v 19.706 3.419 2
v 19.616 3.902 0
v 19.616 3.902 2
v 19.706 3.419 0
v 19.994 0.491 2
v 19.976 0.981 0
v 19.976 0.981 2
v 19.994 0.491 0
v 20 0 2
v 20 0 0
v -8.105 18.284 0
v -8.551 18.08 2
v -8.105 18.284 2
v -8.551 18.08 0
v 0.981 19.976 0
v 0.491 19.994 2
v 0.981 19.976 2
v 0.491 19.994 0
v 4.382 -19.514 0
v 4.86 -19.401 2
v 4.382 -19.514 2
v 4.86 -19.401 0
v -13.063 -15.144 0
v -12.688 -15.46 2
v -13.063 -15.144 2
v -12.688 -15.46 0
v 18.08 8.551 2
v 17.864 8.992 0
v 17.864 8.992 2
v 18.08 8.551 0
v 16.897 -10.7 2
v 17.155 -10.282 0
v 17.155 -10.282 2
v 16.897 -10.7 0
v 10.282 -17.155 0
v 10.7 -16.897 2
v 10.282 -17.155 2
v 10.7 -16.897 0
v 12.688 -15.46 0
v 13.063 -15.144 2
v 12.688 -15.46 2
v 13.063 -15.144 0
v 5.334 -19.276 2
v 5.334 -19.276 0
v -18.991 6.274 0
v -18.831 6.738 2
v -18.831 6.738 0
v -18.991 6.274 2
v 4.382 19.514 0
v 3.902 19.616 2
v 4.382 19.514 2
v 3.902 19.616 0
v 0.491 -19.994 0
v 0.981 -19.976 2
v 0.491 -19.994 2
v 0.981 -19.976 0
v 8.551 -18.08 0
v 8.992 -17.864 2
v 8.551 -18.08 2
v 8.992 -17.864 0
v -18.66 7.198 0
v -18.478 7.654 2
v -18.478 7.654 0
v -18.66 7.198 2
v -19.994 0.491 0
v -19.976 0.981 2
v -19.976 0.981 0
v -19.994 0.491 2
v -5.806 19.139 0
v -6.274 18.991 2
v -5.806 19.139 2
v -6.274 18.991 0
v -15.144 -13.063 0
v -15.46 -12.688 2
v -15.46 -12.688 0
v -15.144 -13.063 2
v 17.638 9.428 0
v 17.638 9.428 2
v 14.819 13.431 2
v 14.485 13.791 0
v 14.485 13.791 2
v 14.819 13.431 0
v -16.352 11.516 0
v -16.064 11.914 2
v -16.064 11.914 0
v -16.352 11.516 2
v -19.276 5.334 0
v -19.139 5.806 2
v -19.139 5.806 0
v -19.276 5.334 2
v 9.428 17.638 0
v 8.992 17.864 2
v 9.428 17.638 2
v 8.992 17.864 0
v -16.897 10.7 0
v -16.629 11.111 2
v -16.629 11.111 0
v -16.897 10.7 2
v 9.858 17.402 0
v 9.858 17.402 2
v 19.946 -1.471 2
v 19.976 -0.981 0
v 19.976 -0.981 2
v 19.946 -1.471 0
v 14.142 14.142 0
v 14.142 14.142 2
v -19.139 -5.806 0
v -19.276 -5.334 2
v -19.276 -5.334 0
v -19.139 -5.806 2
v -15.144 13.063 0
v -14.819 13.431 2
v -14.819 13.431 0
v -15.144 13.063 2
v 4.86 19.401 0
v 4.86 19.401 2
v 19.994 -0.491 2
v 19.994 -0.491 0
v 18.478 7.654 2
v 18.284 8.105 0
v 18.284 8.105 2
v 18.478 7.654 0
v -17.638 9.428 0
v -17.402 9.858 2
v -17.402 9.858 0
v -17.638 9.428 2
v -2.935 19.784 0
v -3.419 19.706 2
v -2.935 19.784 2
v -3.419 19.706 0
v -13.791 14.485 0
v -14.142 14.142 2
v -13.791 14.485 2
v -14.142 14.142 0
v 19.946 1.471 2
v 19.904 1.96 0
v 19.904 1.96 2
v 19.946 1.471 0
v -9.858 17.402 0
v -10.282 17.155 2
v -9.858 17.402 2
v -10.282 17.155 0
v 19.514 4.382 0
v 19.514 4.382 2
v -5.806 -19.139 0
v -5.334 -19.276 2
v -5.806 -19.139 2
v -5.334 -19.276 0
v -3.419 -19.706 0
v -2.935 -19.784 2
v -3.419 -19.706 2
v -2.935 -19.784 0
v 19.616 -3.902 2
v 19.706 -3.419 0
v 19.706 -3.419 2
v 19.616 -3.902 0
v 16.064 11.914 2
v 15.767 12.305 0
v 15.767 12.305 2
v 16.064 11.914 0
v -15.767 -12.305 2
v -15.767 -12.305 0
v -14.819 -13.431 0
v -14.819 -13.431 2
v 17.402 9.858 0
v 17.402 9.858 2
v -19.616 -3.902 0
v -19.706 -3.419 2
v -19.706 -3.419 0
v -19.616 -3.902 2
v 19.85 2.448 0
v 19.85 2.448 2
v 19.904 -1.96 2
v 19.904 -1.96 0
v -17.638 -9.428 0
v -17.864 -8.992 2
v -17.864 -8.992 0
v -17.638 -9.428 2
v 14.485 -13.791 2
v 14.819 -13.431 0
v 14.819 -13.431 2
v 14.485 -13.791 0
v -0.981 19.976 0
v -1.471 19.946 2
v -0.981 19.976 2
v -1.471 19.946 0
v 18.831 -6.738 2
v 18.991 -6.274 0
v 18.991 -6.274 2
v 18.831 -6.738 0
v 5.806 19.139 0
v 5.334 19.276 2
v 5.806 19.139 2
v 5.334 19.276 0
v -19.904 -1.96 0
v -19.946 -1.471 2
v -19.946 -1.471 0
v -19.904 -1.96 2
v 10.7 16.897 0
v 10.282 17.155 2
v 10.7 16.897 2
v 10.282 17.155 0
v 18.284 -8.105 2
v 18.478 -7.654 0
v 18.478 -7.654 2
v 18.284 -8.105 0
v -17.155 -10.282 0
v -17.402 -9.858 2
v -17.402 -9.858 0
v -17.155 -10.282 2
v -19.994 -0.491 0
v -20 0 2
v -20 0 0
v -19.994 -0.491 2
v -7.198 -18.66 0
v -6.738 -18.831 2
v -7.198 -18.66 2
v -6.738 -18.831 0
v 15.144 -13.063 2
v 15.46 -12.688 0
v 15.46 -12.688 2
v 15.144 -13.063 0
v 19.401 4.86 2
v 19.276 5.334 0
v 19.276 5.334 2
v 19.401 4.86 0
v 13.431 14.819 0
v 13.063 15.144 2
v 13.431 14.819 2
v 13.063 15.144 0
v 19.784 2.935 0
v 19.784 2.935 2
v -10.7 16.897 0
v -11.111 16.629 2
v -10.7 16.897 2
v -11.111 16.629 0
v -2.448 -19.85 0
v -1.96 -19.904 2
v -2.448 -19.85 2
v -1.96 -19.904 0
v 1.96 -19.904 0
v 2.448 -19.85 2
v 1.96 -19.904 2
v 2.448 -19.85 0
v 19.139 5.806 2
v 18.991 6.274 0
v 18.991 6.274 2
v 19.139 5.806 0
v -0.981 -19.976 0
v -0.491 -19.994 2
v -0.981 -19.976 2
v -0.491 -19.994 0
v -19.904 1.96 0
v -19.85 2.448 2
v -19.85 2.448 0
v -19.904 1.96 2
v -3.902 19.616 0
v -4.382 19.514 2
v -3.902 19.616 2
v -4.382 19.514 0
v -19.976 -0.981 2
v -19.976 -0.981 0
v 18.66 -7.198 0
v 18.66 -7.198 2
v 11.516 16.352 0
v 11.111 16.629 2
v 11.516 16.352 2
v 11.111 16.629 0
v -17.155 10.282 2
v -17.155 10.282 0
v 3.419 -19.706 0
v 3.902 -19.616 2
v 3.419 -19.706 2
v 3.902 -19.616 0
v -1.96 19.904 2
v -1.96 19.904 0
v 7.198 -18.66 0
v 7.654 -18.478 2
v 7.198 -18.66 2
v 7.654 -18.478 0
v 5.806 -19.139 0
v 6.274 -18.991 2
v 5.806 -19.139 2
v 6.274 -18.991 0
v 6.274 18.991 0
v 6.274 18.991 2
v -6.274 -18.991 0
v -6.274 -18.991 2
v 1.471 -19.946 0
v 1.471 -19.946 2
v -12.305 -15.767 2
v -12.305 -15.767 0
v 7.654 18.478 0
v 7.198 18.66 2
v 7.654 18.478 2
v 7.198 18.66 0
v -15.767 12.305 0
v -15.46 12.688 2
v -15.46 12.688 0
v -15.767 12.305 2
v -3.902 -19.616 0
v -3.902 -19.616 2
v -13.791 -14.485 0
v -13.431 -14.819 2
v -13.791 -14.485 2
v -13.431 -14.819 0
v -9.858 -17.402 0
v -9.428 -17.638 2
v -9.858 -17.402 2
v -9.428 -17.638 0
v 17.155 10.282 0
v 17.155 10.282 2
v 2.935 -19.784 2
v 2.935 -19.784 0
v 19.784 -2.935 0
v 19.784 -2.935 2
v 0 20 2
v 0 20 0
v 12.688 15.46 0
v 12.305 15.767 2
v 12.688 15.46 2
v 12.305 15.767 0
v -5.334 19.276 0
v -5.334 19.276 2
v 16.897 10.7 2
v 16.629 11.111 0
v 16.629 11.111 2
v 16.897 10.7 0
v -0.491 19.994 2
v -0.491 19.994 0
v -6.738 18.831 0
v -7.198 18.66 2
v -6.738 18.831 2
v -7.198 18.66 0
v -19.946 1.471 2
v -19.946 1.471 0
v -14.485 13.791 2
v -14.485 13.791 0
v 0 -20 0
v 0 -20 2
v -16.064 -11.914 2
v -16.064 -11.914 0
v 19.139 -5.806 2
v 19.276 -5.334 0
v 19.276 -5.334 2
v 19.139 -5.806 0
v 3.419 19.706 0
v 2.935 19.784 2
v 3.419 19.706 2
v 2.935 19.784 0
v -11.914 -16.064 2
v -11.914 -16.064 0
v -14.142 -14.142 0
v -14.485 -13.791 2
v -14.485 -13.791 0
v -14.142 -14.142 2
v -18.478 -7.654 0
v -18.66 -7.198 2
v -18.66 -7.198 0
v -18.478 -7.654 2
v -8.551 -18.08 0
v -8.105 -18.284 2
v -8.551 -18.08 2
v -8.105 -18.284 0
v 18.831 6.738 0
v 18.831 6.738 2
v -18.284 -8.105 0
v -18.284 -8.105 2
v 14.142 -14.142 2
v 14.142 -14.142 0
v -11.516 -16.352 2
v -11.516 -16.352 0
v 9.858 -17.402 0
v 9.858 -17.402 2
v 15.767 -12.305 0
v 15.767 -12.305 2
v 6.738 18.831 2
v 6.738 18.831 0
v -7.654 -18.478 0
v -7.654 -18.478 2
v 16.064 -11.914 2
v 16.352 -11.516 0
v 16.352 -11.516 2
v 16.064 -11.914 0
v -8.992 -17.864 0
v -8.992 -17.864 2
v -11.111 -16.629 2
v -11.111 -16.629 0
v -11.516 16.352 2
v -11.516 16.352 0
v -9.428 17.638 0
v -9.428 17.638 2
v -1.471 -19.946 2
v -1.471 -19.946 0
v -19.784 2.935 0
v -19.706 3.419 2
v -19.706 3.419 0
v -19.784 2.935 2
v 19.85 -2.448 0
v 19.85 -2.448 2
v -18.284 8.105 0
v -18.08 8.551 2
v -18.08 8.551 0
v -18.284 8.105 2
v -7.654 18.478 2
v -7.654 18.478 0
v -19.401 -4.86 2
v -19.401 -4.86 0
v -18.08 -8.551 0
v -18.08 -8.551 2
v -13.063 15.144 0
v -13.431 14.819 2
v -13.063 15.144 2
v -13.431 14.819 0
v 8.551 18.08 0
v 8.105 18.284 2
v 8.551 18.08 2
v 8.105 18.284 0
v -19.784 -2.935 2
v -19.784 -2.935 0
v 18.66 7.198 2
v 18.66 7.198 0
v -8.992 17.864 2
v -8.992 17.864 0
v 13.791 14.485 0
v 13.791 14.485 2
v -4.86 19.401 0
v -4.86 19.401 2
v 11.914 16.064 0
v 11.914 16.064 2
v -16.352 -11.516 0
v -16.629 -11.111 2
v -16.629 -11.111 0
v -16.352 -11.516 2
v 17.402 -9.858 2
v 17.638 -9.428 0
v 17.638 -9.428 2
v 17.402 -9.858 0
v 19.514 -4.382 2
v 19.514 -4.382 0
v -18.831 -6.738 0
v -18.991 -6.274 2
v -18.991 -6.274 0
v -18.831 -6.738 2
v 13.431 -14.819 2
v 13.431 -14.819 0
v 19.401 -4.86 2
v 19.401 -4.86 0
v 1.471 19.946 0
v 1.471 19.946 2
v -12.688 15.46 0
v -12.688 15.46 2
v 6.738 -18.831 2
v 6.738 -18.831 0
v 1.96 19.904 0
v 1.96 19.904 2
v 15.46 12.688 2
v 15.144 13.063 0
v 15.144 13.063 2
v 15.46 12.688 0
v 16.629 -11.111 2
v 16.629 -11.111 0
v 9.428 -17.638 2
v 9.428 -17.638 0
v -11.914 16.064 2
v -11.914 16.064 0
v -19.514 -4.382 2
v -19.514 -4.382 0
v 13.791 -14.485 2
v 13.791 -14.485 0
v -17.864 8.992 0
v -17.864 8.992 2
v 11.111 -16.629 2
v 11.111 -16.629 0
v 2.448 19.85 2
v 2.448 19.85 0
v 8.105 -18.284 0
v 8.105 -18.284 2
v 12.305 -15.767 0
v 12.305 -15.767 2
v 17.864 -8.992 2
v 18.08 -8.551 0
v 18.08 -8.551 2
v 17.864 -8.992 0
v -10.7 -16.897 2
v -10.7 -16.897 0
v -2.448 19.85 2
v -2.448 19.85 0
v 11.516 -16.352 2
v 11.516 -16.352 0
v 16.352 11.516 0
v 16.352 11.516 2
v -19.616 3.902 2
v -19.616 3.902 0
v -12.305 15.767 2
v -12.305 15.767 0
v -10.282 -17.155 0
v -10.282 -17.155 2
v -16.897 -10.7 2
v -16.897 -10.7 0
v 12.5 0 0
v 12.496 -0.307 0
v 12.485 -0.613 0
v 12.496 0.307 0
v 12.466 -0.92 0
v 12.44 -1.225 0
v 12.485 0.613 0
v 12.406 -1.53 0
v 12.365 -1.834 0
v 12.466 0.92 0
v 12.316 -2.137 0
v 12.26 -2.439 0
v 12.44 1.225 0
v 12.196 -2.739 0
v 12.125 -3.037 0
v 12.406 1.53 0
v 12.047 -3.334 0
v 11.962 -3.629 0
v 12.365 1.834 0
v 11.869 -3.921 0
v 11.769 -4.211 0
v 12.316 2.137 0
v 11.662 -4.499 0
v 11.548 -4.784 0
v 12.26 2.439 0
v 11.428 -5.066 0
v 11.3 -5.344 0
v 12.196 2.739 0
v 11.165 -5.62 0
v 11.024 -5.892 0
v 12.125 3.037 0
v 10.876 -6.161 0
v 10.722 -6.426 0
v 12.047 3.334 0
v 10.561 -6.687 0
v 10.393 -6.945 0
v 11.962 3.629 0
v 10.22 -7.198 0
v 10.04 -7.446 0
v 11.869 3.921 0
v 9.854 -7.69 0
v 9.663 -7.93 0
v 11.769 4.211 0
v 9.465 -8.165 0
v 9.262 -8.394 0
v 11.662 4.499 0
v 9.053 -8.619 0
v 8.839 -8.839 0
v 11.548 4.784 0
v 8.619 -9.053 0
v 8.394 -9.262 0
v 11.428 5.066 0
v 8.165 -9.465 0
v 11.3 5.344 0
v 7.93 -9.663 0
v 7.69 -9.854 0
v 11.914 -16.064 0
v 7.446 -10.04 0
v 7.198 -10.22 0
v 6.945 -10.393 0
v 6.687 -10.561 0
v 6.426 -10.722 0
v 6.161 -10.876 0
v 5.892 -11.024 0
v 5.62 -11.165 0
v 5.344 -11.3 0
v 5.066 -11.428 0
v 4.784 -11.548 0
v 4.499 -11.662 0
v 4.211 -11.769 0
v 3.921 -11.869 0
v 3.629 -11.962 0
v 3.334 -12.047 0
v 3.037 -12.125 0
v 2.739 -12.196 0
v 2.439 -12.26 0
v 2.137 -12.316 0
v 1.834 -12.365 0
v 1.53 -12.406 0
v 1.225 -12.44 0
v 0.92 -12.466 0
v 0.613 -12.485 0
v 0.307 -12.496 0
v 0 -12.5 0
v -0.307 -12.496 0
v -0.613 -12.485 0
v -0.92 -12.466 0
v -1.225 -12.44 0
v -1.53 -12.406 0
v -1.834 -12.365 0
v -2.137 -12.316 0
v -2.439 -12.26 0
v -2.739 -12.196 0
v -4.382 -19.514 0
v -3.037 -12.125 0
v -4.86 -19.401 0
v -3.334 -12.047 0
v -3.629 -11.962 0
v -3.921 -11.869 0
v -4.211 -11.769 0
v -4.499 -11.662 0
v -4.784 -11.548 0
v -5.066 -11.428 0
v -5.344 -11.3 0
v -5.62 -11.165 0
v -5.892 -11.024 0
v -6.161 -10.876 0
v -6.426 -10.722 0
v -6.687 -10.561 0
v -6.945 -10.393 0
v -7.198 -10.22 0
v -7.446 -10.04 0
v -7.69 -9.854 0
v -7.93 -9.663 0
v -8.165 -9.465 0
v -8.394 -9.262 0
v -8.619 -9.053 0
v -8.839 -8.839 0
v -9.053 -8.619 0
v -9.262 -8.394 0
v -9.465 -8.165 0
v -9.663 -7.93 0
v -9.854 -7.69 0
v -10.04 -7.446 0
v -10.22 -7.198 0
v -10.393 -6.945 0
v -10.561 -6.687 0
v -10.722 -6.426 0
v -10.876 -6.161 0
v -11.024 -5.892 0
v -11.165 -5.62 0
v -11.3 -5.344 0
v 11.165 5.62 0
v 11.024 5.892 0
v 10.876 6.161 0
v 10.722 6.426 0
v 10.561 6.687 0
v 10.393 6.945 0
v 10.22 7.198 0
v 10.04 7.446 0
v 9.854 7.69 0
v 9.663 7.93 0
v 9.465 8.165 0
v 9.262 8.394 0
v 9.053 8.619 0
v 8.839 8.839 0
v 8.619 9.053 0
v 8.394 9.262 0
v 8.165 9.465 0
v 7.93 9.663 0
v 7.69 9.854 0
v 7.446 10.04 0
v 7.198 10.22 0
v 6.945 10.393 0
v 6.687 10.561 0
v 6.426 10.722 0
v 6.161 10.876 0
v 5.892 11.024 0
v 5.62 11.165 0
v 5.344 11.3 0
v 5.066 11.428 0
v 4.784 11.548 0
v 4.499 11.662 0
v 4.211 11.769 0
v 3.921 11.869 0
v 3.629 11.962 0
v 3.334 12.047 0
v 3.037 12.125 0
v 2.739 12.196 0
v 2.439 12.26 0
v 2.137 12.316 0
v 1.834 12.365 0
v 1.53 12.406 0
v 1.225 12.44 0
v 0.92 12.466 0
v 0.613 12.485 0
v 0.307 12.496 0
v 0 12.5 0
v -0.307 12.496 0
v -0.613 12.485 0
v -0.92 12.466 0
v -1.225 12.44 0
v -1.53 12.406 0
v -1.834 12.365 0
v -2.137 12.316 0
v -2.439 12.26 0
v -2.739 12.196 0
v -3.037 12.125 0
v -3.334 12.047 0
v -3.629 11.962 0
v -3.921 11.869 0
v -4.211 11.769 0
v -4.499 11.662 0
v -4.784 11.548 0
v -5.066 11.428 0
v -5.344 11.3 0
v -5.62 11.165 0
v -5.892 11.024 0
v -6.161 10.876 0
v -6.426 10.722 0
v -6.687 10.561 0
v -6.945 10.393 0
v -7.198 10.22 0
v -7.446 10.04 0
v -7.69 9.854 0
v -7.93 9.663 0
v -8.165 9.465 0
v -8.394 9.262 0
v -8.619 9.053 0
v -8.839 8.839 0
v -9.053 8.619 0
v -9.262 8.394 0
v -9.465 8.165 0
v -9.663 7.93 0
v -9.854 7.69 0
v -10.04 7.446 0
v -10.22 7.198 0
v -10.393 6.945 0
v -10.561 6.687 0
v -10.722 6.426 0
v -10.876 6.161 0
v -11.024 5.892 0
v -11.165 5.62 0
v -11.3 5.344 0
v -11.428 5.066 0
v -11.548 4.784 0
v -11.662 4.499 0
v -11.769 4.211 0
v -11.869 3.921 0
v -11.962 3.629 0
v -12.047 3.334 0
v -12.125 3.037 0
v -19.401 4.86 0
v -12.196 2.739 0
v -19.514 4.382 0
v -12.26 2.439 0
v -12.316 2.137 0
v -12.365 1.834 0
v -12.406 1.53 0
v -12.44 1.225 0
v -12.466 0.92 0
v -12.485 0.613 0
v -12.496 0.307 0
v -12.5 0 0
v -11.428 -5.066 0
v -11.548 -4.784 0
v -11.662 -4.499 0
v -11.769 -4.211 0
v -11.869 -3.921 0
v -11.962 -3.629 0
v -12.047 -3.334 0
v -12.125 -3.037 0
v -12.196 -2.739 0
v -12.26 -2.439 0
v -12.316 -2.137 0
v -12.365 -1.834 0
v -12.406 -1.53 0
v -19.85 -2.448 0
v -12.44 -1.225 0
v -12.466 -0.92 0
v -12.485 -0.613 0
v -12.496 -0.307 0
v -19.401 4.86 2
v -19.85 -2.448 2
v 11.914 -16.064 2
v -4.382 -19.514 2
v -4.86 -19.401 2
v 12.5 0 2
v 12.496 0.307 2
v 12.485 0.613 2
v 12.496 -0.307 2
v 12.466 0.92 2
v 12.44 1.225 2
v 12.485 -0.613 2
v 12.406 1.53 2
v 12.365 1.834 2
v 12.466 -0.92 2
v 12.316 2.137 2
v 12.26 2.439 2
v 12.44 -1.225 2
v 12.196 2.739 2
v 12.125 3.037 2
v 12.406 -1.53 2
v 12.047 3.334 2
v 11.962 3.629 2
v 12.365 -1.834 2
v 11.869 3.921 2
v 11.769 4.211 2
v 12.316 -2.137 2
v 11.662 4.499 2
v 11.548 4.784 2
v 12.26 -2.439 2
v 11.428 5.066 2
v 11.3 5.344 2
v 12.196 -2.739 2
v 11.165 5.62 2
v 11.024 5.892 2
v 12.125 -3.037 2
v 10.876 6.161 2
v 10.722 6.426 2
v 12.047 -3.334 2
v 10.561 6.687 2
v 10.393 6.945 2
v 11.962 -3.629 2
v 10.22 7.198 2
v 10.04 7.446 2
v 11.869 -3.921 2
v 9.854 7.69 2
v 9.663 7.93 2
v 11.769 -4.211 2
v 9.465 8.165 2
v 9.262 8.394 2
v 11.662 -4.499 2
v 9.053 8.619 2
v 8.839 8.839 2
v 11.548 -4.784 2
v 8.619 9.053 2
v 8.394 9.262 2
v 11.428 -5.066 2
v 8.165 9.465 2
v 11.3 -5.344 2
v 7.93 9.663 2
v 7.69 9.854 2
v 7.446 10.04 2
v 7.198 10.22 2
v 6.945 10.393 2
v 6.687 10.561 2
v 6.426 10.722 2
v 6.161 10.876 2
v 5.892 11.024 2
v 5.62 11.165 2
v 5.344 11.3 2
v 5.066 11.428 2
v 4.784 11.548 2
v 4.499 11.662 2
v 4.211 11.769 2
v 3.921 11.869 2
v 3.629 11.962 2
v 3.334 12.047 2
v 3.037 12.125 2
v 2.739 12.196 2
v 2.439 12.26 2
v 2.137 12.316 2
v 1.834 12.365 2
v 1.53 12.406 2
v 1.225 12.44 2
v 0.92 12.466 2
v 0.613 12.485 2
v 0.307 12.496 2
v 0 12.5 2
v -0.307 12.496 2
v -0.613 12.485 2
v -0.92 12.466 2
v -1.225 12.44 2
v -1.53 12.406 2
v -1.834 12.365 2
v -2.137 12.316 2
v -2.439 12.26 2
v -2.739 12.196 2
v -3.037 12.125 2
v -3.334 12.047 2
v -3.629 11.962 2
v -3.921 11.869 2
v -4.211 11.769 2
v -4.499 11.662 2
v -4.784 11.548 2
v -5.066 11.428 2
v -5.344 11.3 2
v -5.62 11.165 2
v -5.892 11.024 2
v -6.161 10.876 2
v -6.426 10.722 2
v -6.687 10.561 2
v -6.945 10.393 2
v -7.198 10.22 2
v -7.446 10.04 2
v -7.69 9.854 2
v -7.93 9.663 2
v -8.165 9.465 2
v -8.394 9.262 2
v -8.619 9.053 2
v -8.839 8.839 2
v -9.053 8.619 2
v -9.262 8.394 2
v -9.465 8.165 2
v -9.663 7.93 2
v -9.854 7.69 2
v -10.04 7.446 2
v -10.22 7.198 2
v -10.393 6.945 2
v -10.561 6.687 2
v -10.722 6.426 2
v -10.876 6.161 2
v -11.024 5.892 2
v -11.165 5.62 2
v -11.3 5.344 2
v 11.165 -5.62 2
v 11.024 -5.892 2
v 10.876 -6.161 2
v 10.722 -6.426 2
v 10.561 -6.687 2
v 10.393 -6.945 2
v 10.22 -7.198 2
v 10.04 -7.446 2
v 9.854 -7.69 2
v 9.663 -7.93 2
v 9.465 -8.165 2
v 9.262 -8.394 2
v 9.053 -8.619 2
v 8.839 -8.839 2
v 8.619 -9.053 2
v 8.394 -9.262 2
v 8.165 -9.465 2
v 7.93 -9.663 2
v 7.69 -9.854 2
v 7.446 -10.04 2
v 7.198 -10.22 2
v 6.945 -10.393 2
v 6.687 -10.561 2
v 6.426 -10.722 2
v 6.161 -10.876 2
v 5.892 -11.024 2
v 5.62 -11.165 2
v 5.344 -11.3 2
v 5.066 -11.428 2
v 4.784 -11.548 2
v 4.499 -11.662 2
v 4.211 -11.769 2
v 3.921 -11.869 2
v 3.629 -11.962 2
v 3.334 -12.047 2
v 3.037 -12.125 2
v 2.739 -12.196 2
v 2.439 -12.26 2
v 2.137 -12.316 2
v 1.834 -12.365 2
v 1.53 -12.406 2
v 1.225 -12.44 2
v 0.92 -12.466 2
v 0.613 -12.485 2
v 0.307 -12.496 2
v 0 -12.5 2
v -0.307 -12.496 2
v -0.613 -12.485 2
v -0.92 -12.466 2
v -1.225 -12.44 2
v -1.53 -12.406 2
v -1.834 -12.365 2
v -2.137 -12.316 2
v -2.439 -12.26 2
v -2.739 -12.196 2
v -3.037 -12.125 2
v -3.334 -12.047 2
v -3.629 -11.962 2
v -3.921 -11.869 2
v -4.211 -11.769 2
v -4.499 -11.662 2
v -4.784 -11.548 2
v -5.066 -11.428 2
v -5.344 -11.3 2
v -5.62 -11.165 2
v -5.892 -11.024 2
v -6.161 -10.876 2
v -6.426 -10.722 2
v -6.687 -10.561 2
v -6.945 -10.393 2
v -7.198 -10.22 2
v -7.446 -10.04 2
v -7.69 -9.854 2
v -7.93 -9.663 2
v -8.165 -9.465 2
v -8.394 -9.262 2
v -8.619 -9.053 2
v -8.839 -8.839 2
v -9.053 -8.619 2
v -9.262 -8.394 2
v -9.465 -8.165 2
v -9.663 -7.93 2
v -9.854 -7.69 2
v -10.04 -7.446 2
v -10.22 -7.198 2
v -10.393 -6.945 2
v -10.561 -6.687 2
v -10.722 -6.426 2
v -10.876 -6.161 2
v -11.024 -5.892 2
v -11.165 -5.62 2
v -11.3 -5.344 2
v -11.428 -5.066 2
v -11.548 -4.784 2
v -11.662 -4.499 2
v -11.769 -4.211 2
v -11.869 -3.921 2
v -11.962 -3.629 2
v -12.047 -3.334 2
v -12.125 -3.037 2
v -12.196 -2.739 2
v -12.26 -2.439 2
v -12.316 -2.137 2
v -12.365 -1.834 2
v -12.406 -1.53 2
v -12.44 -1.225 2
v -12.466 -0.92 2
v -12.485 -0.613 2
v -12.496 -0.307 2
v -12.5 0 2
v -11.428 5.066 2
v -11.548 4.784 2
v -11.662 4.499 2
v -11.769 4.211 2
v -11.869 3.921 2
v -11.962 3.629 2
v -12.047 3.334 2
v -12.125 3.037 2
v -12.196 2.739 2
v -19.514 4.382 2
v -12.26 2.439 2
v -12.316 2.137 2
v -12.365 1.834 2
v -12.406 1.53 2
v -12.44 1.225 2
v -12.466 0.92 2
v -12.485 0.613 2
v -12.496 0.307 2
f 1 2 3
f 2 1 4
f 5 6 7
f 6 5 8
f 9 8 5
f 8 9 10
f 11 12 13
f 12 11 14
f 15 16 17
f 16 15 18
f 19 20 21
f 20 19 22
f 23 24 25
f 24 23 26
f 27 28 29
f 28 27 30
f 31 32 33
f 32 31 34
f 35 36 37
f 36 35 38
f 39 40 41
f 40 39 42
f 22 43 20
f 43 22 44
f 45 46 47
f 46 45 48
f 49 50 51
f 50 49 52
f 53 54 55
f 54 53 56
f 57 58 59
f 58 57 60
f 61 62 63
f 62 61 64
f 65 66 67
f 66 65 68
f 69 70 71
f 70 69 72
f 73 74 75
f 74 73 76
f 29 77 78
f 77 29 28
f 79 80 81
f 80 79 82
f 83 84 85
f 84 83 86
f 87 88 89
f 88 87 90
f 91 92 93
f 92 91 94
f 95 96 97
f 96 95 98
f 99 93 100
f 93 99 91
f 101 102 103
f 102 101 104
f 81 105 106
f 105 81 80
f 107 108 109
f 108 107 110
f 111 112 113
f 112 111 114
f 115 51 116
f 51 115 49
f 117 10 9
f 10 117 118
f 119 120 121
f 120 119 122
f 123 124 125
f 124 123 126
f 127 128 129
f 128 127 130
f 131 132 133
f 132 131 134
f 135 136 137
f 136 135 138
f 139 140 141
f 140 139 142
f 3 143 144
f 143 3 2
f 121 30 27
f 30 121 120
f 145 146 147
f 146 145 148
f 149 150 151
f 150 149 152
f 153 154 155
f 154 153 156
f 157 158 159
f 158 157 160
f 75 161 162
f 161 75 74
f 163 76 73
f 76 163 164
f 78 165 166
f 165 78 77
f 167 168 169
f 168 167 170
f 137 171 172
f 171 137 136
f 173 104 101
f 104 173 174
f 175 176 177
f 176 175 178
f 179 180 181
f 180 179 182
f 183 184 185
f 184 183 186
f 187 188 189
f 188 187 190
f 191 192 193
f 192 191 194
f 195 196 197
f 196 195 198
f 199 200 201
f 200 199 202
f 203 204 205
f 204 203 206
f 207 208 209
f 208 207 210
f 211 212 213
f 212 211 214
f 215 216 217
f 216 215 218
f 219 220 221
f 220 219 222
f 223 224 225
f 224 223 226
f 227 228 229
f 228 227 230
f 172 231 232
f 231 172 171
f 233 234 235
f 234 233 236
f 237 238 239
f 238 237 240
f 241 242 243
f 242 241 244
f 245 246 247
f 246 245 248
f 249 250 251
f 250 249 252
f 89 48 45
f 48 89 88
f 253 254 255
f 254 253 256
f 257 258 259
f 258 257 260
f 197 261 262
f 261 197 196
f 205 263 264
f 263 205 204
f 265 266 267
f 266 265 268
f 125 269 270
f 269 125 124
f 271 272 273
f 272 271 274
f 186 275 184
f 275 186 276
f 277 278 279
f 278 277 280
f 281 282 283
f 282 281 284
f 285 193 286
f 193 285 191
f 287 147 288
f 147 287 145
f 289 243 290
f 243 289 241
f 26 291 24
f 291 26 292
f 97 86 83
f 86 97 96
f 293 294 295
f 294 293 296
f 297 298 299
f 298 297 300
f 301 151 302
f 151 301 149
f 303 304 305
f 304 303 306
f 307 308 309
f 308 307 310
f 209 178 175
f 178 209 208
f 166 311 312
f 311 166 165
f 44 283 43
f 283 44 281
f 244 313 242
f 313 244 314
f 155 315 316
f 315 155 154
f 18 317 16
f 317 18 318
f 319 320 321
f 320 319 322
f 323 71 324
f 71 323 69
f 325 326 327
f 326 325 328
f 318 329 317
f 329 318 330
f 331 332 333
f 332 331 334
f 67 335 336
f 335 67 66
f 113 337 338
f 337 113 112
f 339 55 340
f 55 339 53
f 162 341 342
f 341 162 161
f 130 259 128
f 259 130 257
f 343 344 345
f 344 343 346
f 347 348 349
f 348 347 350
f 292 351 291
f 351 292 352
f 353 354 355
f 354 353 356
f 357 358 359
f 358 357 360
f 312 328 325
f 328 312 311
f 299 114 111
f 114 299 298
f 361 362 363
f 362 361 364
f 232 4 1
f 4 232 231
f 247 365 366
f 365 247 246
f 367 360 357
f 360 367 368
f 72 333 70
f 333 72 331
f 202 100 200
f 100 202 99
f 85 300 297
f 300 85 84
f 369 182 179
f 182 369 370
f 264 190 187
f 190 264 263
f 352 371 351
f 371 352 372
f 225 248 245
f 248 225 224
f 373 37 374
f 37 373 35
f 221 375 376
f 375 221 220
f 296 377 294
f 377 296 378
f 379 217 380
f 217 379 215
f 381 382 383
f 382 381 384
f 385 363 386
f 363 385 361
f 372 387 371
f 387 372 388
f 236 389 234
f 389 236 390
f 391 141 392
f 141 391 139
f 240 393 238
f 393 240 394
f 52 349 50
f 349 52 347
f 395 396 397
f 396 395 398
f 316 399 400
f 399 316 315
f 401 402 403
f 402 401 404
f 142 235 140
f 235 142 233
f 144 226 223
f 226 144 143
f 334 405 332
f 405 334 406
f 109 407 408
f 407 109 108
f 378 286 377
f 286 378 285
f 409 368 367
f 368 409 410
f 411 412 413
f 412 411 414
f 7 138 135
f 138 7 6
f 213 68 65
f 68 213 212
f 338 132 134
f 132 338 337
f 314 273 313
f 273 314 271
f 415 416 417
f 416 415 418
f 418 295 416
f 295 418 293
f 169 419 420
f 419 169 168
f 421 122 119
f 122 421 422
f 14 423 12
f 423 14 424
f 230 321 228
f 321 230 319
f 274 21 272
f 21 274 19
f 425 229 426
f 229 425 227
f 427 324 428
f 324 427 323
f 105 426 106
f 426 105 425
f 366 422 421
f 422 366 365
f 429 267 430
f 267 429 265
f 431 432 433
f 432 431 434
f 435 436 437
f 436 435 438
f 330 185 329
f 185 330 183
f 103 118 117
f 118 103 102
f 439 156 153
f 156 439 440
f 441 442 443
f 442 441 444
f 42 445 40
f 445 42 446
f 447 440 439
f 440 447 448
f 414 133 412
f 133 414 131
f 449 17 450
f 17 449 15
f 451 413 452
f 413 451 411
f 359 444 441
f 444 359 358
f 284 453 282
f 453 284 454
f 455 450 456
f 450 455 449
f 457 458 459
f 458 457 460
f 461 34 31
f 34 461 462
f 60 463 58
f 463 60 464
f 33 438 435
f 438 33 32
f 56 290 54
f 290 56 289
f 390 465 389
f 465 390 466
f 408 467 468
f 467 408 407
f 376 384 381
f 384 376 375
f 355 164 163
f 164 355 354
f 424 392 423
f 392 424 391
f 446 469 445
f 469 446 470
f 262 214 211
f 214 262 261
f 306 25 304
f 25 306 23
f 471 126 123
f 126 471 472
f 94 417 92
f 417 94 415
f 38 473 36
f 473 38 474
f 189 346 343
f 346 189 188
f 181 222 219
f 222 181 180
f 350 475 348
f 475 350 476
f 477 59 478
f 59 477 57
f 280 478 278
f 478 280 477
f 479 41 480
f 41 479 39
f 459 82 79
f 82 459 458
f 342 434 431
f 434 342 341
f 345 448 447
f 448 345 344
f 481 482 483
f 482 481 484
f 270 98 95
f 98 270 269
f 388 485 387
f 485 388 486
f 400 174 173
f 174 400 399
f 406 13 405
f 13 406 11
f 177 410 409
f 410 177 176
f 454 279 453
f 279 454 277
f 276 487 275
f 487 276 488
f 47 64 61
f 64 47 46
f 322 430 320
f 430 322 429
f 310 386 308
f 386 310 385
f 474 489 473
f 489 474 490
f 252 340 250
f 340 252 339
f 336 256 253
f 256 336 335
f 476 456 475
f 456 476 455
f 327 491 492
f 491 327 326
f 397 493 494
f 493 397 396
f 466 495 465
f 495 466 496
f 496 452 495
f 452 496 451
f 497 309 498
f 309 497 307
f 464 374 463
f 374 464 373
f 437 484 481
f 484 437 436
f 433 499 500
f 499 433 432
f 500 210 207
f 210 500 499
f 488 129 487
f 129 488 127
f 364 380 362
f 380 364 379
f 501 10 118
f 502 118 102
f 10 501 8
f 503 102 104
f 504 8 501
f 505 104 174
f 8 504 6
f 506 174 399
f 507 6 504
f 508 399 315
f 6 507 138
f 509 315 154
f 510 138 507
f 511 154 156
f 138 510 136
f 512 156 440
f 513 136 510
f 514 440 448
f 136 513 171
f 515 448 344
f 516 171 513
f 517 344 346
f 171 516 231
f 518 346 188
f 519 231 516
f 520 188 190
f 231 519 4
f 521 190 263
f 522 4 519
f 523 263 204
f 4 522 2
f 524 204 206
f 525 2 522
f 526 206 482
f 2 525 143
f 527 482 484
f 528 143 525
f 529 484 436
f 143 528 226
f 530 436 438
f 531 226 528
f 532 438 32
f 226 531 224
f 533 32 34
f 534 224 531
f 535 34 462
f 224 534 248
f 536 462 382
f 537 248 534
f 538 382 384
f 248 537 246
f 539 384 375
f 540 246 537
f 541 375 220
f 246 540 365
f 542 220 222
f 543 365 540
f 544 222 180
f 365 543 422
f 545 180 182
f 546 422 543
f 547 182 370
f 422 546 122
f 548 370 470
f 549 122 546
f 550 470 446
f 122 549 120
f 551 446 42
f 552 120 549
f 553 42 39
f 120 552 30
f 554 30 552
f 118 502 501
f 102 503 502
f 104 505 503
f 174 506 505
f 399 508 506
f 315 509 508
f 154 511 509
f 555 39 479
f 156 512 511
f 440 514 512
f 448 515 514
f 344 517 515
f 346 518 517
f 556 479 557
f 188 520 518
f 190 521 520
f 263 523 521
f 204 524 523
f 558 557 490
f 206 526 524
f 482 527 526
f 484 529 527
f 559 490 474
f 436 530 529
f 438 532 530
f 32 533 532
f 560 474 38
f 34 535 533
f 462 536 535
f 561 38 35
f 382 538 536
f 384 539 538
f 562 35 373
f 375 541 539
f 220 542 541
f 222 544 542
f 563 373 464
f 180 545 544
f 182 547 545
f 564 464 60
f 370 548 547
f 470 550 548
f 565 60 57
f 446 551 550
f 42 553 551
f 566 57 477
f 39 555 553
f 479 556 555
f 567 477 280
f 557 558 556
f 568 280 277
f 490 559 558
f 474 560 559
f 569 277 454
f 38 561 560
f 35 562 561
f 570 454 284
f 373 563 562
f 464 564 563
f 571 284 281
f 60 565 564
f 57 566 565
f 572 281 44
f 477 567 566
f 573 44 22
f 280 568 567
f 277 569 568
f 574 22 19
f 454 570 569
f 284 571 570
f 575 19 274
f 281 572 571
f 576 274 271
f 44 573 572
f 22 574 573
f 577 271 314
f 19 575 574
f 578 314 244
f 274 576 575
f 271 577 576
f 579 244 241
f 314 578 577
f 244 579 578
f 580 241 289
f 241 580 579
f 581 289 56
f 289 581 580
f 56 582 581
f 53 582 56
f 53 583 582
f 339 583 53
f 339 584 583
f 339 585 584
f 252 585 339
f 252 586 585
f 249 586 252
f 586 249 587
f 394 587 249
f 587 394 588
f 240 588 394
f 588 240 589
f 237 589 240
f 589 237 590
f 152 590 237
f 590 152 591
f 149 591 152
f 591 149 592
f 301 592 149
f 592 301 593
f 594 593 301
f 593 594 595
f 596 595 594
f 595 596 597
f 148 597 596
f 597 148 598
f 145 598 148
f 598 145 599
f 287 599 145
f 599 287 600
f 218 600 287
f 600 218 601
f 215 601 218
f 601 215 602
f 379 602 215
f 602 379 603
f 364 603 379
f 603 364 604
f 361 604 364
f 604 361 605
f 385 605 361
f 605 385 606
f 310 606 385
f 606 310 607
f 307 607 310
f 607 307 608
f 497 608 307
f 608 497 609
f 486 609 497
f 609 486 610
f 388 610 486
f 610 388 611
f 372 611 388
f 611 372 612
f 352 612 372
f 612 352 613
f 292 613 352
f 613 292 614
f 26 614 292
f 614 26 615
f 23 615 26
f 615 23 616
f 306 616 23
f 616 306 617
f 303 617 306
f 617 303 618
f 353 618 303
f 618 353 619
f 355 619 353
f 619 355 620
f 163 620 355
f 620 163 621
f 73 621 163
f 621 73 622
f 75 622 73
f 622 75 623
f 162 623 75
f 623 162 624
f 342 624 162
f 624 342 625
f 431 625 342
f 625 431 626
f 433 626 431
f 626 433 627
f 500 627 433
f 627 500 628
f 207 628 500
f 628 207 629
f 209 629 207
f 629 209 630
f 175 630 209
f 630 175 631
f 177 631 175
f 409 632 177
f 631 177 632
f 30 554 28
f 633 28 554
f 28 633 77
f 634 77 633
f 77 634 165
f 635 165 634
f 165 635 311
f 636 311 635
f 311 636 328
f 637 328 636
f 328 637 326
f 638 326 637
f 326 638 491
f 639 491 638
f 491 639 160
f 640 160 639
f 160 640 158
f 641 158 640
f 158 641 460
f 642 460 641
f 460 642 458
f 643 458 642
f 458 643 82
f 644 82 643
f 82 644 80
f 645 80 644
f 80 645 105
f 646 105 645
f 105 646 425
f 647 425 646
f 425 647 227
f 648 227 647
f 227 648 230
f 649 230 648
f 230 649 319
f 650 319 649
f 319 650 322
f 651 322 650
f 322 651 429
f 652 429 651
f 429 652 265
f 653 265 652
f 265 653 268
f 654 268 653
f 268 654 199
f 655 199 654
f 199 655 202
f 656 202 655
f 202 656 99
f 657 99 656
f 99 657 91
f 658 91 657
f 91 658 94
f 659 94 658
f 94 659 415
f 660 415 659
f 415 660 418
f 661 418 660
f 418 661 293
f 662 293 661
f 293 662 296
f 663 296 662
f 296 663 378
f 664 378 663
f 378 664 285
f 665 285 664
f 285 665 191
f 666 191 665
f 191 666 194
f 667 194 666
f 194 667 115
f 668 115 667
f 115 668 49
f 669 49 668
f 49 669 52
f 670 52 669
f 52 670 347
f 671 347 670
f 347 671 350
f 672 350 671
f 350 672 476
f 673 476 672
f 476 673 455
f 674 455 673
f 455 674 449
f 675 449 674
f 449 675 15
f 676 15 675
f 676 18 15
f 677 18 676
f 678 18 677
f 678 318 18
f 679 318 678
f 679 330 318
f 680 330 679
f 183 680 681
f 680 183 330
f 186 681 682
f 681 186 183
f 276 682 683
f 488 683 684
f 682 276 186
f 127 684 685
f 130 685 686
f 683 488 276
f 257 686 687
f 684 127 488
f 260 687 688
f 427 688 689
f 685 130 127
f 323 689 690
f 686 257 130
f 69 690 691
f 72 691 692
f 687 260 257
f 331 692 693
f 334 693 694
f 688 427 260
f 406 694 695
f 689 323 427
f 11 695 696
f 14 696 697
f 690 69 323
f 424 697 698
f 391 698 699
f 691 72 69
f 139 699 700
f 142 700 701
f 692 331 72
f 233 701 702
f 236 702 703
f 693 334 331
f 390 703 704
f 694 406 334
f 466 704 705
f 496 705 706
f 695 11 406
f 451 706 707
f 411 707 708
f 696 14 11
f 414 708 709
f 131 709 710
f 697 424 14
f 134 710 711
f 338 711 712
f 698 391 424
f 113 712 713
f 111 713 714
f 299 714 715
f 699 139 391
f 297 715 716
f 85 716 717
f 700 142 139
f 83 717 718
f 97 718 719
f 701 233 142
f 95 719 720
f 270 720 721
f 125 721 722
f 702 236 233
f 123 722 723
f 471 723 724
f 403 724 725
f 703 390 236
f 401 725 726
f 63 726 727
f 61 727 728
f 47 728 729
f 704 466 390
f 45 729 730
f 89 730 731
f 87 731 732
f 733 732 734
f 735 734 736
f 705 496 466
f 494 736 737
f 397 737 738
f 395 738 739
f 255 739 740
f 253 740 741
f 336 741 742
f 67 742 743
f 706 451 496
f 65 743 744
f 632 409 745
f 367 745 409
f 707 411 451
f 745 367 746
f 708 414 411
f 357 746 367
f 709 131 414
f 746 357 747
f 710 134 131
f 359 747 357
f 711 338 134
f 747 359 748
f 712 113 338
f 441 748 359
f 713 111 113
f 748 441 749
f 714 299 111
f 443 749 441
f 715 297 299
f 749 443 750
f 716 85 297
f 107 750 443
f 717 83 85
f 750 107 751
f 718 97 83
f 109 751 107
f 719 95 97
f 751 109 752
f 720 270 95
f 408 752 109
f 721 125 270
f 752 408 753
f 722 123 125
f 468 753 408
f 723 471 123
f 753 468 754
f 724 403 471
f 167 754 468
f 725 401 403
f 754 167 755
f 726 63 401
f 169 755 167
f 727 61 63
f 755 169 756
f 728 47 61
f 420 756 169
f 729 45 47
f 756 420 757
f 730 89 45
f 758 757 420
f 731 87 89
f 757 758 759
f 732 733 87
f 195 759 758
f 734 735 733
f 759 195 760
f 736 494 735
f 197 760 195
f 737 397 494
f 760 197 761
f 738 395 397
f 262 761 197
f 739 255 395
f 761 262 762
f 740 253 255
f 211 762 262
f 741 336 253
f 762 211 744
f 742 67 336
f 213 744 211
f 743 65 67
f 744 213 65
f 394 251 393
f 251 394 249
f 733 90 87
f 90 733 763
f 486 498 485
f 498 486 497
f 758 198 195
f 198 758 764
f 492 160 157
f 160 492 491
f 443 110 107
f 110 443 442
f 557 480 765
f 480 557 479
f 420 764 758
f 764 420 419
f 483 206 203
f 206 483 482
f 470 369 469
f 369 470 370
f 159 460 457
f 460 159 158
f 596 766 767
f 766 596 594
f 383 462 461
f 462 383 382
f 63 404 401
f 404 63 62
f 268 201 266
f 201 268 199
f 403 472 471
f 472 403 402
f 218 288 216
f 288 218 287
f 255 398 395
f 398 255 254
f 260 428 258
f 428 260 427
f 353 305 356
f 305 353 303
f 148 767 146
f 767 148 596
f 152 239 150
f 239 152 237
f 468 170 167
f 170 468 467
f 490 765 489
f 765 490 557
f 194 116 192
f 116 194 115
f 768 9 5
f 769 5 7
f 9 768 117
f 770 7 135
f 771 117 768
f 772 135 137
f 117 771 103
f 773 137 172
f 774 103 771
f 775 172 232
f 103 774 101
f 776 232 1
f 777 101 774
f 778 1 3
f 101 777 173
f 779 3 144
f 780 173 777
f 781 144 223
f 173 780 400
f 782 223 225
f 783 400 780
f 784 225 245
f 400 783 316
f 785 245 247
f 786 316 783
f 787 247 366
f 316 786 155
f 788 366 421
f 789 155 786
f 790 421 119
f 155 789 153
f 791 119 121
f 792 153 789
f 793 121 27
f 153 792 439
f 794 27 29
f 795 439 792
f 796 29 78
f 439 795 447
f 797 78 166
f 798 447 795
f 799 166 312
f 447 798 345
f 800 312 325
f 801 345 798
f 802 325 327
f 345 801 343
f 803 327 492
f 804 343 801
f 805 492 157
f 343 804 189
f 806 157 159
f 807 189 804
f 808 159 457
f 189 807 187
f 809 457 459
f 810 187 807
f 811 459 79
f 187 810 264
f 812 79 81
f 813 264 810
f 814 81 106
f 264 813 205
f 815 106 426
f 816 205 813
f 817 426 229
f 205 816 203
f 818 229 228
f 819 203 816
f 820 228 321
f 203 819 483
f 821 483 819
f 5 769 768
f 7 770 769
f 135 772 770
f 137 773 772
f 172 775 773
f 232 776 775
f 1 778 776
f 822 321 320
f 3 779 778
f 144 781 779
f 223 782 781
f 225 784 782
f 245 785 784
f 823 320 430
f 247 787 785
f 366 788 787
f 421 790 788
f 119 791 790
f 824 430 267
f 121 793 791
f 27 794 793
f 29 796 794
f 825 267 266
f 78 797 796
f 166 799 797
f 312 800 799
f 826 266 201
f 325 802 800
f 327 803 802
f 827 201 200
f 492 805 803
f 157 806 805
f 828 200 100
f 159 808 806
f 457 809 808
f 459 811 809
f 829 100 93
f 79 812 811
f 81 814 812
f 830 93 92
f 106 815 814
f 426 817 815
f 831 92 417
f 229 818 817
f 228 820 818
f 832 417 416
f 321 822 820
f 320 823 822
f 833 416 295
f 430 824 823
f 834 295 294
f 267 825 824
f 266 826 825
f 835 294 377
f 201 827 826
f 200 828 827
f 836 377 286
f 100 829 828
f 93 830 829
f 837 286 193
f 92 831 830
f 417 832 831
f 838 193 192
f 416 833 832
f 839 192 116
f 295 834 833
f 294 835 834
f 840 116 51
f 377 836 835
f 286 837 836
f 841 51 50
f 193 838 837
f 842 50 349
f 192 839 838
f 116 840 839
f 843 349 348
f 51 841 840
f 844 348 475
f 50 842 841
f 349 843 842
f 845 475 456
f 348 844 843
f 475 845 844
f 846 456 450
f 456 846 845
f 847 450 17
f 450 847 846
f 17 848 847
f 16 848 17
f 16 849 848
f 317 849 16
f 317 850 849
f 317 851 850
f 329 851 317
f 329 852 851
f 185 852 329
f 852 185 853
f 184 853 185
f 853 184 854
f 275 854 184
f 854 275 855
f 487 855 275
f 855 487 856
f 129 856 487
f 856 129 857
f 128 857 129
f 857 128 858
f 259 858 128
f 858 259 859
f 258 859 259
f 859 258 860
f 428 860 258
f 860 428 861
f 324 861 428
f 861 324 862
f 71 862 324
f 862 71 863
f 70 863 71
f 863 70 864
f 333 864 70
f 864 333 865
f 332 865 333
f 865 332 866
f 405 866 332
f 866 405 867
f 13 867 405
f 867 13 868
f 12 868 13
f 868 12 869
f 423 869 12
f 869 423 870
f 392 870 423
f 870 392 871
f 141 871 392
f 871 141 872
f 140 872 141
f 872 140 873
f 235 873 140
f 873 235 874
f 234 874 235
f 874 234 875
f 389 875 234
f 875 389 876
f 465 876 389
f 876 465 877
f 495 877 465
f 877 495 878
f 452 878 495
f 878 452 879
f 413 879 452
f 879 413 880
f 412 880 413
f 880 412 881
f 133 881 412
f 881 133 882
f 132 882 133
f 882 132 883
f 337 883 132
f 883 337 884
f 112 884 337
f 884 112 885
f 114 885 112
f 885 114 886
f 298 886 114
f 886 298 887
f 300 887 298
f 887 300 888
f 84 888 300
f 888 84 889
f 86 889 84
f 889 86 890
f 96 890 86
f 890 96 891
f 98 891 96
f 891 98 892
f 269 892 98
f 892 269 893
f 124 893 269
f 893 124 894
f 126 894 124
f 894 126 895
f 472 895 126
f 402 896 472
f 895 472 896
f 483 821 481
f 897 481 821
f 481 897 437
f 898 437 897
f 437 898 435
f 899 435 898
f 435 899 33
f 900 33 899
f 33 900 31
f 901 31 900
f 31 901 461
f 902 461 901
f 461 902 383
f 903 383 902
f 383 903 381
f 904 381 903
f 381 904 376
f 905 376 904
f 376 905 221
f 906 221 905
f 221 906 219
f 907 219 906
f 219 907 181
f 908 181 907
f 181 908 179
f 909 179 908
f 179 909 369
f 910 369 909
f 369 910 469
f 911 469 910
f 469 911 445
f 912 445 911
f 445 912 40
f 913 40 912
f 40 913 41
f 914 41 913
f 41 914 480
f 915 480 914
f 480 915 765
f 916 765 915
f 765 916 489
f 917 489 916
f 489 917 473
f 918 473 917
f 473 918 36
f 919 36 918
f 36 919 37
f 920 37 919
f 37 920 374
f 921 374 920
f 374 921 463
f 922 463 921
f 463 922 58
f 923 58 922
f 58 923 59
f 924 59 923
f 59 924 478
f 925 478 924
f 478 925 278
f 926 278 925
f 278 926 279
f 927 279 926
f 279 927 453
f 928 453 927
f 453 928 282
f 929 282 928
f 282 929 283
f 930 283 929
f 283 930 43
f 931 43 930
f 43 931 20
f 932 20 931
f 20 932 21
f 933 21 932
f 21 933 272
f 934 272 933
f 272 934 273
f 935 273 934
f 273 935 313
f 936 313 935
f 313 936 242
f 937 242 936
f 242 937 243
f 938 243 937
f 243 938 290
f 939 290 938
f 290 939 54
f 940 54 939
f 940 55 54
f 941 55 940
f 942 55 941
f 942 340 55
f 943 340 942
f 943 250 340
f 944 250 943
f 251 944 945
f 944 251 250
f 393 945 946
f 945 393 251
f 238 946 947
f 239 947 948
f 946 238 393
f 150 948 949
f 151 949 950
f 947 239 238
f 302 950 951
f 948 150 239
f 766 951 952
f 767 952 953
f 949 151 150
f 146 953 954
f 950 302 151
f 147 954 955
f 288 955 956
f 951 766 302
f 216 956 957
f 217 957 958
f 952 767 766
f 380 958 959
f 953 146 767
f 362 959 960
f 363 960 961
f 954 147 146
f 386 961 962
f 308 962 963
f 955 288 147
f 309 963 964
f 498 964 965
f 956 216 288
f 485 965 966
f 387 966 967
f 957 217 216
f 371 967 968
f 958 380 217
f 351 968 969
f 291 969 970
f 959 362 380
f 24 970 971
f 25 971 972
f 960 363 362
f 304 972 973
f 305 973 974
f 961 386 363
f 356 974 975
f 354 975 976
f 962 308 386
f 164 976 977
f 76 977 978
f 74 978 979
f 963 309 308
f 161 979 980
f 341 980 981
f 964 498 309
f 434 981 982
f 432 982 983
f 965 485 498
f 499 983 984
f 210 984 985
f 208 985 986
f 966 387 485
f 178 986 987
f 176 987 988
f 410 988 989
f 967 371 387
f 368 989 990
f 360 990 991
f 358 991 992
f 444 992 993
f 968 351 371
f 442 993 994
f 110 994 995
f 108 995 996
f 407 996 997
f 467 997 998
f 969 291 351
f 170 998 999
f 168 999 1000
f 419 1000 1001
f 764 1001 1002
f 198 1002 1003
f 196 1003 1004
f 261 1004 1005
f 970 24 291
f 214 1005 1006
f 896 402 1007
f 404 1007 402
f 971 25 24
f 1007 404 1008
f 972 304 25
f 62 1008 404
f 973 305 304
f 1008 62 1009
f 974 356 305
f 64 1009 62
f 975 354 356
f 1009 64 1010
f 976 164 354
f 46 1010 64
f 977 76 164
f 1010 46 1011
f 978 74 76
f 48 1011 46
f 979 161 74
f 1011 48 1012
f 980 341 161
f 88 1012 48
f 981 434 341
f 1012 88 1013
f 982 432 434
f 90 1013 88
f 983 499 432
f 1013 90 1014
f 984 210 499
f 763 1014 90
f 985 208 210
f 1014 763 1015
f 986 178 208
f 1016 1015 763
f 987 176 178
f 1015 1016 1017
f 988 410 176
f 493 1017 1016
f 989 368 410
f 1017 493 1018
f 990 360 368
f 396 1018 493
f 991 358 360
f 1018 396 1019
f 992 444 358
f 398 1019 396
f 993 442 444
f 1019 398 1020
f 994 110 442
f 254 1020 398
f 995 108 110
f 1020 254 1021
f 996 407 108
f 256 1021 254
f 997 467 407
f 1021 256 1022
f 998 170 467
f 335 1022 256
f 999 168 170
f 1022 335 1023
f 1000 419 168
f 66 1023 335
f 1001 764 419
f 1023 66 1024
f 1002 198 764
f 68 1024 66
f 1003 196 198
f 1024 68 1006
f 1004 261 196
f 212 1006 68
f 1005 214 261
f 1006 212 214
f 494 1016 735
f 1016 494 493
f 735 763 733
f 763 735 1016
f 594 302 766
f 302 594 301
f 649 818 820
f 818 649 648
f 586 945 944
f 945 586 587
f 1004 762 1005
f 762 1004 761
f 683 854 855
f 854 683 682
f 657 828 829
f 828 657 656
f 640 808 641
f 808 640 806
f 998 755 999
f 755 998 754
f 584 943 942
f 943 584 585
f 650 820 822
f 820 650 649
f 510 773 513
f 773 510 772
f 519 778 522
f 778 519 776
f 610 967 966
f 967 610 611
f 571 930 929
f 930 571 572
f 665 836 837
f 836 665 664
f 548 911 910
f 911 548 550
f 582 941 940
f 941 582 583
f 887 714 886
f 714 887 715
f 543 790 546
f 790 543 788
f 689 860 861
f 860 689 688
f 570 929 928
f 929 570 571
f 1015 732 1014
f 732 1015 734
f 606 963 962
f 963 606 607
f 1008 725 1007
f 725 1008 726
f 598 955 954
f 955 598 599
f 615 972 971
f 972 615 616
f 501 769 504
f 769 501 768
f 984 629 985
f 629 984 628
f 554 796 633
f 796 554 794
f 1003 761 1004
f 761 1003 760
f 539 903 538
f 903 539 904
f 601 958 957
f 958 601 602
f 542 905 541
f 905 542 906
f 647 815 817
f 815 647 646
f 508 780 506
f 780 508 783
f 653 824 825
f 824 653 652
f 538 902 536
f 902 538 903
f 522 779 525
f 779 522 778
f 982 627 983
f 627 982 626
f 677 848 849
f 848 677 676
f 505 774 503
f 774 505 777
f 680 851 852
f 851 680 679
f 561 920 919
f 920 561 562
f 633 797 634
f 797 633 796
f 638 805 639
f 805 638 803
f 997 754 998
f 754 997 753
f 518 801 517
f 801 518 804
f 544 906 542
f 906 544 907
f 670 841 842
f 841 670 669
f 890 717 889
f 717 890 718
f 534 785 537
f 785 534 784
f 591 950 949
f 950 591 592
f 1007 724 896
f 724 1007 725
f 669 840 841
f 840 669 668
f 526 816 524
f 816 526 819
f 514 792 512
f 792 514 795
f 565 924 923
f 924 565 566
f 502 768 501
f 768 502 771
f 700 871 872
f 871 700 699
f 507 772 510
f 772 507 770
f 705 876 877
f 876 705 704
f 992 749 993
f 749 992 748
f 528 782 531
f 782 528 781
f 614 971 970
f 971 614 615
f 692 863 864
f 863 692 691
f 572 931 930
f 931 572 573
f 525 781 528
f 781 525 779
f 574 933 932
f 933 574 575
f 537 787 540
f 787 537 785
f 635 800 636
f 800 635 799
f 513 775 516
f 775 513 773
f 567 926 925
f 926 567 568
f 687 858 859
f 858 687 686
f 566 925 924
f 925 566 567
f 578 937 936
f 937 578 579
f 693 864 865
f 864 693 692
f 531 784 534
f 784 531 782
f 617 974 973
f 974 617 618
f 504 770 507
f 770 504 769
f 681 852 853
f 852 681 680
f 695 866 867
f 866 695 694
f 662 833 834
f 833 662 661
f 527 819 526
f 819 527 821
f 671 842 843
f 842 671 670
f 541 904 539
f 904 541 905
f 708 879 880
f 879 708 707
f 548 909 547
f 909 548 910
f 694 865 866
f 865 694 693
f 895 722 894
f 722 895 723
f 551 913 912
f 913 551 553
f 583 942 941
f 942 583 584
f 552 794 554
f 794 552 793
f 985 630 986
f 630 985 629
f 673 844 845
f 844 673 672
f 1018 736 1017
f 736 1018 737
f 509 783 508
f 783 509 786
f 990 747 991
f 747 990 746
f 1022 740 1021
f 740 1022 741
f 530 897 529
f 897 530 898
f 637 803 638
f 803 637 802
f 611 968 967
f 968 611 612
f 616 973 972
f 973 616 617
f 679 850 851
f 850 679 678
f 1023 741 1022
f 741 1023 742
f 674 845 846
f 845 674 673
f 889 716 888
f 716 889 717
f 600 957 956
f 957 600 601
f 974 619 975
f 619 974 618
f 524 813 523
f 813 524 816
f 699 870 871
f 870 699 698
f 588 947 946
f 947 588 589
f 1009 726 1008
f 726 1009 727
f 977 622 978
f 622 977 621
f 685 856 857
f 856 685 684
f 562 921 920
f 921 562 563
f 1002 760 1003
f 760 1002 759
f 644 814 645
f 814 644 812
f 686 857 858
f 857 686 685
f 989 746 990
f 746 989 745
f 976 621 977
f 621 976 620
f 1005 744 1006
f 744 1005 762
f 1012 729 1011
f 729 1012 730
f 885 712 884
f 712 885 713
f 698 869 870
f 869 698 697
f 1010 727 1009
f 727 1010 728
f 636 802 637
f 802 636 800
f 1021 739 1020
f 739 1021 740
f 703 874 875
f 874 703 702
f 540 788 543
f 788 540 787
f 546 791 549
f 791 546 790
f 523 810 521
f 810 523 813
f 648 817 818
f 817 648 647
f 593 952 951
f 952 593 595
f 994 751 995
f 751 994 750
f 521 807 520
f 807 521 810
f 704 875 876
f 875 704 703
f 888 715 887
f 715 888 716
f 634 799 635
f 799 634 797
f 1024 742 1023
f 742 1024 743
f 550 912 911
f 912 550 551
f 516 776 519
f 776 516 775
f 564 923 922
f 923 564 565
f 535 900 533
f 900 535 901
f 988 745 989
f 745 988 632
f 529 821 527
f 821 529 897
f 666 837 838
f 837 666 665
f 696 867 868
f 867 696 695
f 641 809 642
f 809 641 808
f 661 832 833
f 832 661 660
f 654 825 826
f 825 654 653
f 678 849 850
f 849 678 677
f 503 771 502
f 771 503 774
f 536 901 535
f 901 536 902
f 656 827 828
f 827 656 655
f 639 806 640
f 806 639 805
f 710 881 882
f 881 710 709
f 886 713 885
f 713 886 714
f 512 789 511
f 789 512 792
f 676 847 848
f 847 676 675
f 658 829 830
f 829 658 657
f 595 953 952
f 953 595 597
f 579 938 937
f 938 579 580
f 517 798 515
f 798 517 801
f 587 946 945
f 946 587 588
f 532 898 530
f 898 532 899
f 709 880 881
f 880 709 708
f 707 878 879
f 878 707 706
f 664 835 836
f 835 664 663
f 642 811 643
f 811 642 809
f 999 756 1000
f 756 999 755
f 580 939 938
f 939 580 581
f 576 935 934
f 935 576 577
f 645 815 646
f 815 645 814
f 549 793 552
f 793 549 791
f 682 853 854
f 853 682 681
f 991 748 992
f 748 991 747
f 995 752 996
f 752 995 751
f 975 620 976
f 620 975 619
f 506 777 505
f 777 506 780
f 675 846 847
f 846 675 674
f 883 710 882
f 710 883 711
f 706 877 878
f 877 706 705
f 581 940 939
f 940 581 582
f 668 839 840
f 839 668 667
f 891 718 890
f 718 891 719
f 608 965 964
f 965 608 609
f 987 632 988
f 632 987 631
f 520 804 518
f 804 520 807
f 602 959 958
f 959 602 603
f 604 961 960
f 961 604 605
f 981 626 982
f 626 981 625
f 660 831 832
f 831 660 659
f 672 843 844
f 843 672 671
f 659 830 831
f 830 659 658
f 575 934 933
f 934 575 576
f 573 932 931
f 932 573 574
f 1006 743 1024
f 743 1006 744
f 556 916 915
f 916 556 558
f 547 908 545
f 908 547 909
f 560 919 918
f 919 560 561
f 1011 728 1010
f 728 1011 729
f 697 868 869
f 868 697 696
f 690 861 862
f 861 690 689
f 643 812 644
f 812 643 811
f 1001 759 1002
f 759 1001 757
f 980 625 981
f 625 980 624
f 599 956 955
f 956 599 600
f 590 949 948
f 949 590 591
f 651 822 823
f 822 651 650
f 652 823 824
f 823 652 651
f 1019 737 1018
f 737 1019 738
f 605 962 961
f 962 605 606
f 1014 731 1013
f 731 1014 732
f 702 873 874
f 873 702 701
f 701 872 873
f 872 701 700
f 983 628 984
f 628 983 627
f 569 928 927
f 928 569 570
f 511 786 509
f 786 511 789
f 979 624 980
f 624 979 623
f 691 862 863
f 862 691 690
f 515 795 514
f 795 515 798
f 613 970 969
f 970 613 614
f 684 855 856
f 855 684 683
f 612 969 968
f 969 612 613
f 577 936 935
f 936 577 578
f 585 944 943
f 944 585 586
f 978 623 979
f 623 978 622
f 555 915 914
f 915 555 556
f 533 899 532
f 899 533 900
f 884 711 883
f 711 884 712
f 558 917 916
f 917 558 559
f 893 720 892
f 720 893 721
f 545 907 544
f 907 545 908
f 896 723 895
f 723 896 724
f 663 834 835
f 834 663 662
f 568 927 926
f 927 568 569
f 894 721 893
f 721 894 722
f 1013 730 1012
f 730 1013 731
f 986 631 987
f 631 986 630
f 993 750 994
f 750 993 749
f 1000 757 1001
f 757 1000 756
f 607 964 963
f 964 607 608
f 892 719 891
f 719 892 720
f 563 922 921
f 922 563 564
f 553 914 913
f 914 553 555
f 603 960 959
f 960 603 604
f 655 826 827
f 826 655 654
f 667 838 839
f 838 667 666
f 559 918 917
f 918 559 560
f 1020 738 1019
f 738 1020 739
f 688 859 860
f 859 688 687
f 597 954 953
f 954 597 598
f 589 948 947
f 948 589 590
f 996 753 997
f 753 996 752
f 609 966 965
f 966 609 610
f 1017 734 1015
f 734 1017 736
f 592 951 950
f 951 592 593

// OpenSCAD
innerDiam=25;
outerDiam=40;
thikness=2;

$fn=256;

difference() {
    cylinder(h=thikness, d=outerDiam);
    cylinder(h=thikness, d=innerDiam);
}
